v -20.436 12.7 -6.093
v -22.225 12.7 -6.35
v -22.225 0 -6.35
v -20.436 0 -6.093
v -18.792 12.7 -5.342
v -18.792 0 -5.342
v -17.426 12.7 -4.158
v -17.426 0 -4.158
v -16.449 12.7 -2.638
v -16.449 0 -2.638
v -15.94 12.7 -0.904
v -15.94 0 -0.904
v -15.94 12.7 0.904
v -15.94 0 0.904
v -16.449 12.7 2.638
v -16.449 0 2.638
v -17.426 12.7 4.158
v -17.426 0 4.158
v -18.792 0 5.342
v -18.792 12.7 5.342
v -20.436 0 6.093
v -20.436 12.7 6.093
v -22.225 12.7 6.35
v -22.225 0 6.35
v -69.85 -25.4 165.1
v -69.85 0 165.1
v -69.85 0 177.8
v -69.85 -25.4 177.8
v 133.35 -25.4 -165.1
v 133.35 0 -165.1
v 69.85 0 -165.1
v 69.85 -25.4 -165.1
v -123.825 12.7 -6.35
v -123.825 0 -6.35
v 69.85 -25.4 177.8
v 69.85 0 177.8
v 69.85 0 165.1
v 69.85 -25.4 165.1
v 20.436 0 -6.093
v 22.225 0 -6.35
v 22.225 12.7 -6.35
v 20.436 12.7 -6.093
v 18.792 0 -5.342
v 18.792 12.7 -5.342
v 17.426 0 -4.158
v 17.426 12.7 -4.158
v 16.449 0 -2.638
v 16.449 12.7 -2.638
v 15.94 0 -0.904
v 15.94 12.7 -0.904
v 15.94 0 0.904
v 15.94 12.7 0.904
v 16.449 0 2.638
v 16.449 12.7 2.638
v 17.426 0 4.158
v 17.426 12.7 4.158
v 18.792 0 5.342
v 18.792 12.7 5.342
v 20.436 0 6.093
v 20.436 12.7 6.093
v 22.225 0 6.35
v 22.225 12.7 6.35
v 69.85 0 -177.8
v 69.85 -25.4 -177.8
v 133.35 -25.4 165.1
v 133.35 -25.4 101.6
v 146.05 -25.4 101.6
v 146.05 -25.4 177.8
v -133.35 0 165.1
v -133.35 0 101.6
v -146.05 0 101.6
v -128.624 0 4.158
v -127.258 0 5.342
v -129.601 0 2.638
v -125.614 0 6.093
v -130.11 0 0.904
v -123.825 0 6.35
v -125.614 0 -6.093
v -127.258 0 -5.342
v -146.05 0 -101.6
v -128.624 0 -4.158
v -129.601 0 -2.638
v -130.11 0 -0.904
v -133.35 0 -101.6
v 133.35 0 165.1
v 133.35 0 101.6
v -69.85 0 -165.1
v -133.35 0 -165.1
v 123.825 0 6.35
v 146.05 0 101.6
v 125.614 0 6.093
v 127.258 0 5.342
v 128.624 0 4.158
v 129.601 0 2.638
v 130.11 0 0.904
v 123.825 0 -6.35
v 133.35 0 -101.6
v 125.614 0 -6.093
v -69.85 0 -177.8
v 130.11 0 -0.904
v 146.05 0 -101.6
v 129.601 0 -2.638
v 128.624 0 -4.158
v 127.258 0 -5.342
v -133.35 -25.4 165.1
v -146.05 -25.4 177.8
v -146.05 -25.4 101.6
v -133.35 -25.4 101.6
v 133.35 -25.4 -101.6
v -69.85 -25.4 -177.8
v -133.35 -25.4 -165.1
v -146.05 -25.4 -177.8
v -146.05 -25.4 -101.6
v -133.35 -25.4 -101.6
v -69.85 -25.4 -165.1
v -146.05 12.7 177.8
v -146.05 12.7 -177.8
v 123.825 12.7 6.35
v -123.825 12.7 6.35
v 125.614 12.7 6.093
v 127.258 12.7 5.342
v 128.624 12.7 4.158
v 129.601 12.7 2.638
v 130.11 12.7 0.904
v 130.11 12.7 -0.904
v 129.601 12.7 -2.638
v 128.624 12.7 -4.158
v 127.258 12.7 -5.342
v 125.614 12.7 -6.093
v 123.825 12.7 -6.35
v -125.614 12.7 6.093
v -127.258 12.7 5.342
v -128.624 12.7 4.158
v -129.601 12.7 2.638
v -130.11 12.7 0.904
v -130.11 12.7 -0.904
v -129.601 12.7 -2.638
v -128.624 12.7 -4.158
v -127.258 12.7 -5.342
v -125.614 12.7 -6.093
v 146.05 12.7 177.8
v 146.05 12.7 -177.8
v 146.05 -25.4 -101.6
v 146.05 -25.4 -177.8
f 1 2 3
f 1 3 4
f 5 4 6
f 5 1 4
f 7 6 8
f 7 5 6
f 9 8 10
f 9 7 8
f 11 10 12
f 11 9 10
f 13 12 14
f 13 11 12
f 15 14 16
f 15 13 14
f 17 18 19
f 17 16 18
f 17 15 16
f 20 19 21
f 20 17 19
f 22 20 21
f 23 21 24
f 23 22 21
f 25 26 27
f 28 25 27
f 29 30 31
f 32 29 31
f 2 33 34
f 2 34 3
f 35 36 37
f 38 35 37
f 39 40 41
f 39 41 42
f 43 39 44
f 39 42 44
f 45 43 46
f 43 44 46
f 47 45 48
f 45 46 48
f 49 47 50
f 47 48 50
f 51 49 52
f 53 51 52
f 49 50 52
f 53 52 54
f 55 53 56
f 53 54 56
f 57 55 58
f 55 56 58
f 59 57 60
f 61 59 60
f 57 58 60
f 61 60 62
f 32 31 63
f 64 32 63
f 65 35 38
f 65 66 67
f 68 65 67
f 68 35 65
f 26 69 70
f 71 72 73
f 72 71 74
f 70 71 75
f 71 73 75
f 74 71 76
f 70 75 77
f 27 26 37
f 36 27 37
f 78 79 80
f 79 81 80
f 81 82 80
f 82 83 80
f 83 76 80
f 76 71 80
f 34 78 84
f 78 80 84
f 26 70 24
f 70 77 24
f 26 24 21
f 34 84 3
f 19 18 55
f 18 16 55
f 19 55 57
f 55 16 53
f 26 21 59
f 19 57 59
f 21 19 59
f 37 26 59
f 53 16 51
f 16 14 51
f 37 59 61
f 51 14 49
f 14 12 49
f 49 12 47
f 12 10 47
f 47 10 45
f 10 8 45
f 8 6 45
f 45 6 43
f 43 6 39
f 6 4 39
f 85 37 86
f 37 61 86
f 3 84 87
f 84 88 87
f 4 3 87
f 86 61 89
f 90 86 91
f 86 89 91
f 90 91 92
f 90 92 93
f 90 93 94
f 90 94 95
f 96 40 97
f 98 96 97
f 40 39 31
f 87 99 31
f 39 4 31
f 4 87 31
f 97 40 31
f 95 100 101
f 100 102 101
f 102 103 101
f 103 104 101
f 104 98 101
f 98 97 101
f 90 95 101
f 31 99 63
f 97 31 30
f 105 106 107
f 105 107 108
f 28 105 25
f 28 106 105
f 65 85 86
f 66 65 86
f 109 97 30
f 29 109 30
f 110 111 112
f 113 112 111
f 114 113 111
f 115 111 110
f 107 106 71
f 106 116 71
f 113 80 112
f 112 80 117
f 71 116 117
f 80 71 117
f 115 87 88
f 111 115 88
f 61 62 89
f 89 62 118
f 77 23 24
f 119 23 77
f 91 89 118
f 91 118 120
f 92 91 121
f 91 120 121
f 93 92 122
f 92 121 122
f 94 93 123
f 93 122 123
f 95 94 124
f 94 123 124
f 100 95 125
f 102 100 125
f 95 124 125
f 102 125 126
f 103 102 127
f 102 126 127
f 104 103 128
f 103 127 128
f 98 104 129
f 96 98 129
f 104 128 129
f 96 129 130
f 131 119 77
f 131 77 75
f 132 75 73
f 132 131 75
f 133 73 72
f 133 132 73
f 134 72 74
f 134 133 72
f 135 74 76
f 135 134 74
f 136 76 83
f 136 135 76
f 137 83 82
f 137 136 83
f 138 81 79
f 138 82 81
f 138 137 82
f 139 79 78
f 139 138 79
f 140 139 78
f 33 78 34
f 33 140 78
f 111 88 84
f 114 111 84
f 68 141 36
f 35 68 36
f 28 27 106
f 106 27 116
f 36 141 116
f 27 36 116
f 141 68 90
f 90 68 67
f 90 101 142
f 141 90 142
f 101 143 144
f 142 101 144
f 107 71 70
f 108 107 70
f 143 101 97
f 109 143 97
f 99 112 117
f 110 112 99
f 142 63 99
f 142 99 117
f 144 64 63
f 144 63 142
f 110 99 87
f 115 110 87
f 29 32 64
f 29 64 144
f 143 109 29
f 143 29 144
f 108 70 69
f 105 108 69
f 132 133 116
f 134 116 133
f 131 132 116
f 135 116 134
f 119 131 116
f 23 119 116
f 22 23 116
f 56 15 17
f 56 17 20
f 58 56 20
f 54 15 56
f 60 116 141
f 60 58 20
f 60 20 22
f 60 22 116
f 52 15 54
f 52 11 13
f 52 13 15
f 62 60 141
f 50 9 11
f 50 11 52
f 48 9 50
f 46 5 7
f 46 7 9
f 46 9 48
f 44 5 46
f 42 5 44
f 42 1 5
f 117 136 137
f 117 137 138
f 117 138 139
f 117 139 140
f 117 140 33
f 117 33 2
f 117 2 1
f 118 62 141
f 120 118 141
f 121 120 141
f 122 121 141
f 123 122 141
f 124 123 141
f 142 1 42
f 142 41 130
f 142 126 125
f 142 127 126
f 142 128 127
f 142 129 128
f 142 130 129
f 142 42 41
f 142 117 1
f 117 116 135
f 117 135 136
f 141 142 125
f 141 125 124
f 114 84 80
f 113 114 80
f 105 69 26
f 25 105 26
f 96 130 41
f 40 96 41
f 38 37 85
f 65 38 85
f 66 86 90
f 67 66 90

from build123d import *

# Parameters (mm, degrees)
SKETCH1_W           = 292.1
SKETCH1_H           = 355.6
SKETCH1_W_2         = 215.9
SKETCH1_H_2         = 279.4
BOSS_EXTRUDE1_DEPTH = 12.7
CUT_EXTRUDE1_DEPTH  = 13.7
BOSS_EXTRUDE2_DEPTH = 25.4


with BuildPart() as part:
    # Sketch1 → Boss-Extrude1 (new body)
    with BuildSketch(Plane(origin=(0, 0, 0), x_dir=(1, 0, 0), z_dir=(0, 1, 0))):
        Rectangle(SKETCH1_W, SKETCH1_H)
        Polygon((-69.85, 139.7), (69.85, 139.7), (69.85, 152.4), (120.65, 152.4), (120.65, 101.6), (107.95, 101.6), (107.95, -101.6), (120.65, -101.6), (120.65, -152.4), (69.85, -152.4), (69.85, -139.7), (-69.85, -139.7), (-69.85, -152.4), (-120.65, -152.4), (-120.65, -101.6), (-107.95, -101.6), (-107.95, 101.6), (-120.65, 101.6), (-120.65, 152.4), (-69.85, 152.4), align=None, mode=Mode.SUBTRACT)
        Polygon((-107.95, 139.7), (-69.85, 139.7), (-69.85, 152.4), (-120.65, 152.4), (-120.65, 101.6), (-107.95, 101.6), align=None)
        Polygon((-107.95, -139.7), (-107.95, -101.6), (-120.65, -101.6), (-120.65, -152.4), (-69.85, -152.4), (-69.85, -139.7), align=None)
        Rectangle(SKETCH1_W_2, SKETCH1_H_2)
        Polygon((120.65, -101.6), (107.95, -101.6), (107.95, -139.7), (69.85, -139.7), (69.85, -152.4), (120.65, -152.4), align=None)
        Polygon((69.85, 152.4), (69.85, 139.7), (107.95, 139.7), (107.95, 101.6), (120.65, 101.6), (120.65, 152.4), align=None)
    extrude(amount=BOSS_EXTRUDE1_DEPTH)

    # Sketch2 → Cut-Extrude1 (cut, through all)
    with BuildSketch(Plane(origin=(0, 12.7, 0), x_dir=(1, 0, 0), z_dir=(0, 1, 0))):
        with BuildLine():
            Line((-123.825, 6.35), (-22.225, 6.35))
            ThreePointArc((-22.225, 6.35), (-15.875, 0), (-22.225, -6.35))
            Line((-22.225, -6.35), (-123.825, -6.35))
            ThreePointArc((-123.825, -6.35), (-130.175, 0), (-123.825, 6.35))
        make_face()
        with BuildLine():
            Line((123.825, 6.35), (22.225, 6.35))
            ThreePointArc((22.225, 6.35), (15.875, 0), (22.225, -6.35))
            Line((22.225, -6.35), (123.825, -6.35))
            ThreePointArc((123.825, -6.35), (130.175, 0), (123.825, 6.35))
        make_face()
    extrude(amount=-CUT_EXTRUDE1_DEPTH, mode=Mode.SUBTRACT)

    # Sketch3 → Boss-Extrude2 (add)
    with BuildSketch(Plane.XZ):
        Polygon((-69.85, 177.8), (-146.05, 177.8), (-146.05, 101.6), (-133.35, 101.6), (-133.35, 165.1), (-69.85, 165.1), align=None)
        Polygon((146.05, 177.8), (69.85, 177.8), (69.85, 165.1), (133.35, 165.1), (133.35, 101.6), (146.05, 101.6), align=None)
        Polygon((146.05, -177.8), (146.05, -101.6), (133.35, -101.6), (133.35, -165.1), (69.85, -165.1), (69.85, -177.8), align=None)
        Polygon((-133.35, -101.6), (-146.05, -101.6), (-146.05, -177.8), (-69.85, -177.8), (-69.85, -165.1), (-133.35, -165.1), align=None)
    extrude(amount=BOSS_EXTRUDE2_DEPTH)


solid = part.part
